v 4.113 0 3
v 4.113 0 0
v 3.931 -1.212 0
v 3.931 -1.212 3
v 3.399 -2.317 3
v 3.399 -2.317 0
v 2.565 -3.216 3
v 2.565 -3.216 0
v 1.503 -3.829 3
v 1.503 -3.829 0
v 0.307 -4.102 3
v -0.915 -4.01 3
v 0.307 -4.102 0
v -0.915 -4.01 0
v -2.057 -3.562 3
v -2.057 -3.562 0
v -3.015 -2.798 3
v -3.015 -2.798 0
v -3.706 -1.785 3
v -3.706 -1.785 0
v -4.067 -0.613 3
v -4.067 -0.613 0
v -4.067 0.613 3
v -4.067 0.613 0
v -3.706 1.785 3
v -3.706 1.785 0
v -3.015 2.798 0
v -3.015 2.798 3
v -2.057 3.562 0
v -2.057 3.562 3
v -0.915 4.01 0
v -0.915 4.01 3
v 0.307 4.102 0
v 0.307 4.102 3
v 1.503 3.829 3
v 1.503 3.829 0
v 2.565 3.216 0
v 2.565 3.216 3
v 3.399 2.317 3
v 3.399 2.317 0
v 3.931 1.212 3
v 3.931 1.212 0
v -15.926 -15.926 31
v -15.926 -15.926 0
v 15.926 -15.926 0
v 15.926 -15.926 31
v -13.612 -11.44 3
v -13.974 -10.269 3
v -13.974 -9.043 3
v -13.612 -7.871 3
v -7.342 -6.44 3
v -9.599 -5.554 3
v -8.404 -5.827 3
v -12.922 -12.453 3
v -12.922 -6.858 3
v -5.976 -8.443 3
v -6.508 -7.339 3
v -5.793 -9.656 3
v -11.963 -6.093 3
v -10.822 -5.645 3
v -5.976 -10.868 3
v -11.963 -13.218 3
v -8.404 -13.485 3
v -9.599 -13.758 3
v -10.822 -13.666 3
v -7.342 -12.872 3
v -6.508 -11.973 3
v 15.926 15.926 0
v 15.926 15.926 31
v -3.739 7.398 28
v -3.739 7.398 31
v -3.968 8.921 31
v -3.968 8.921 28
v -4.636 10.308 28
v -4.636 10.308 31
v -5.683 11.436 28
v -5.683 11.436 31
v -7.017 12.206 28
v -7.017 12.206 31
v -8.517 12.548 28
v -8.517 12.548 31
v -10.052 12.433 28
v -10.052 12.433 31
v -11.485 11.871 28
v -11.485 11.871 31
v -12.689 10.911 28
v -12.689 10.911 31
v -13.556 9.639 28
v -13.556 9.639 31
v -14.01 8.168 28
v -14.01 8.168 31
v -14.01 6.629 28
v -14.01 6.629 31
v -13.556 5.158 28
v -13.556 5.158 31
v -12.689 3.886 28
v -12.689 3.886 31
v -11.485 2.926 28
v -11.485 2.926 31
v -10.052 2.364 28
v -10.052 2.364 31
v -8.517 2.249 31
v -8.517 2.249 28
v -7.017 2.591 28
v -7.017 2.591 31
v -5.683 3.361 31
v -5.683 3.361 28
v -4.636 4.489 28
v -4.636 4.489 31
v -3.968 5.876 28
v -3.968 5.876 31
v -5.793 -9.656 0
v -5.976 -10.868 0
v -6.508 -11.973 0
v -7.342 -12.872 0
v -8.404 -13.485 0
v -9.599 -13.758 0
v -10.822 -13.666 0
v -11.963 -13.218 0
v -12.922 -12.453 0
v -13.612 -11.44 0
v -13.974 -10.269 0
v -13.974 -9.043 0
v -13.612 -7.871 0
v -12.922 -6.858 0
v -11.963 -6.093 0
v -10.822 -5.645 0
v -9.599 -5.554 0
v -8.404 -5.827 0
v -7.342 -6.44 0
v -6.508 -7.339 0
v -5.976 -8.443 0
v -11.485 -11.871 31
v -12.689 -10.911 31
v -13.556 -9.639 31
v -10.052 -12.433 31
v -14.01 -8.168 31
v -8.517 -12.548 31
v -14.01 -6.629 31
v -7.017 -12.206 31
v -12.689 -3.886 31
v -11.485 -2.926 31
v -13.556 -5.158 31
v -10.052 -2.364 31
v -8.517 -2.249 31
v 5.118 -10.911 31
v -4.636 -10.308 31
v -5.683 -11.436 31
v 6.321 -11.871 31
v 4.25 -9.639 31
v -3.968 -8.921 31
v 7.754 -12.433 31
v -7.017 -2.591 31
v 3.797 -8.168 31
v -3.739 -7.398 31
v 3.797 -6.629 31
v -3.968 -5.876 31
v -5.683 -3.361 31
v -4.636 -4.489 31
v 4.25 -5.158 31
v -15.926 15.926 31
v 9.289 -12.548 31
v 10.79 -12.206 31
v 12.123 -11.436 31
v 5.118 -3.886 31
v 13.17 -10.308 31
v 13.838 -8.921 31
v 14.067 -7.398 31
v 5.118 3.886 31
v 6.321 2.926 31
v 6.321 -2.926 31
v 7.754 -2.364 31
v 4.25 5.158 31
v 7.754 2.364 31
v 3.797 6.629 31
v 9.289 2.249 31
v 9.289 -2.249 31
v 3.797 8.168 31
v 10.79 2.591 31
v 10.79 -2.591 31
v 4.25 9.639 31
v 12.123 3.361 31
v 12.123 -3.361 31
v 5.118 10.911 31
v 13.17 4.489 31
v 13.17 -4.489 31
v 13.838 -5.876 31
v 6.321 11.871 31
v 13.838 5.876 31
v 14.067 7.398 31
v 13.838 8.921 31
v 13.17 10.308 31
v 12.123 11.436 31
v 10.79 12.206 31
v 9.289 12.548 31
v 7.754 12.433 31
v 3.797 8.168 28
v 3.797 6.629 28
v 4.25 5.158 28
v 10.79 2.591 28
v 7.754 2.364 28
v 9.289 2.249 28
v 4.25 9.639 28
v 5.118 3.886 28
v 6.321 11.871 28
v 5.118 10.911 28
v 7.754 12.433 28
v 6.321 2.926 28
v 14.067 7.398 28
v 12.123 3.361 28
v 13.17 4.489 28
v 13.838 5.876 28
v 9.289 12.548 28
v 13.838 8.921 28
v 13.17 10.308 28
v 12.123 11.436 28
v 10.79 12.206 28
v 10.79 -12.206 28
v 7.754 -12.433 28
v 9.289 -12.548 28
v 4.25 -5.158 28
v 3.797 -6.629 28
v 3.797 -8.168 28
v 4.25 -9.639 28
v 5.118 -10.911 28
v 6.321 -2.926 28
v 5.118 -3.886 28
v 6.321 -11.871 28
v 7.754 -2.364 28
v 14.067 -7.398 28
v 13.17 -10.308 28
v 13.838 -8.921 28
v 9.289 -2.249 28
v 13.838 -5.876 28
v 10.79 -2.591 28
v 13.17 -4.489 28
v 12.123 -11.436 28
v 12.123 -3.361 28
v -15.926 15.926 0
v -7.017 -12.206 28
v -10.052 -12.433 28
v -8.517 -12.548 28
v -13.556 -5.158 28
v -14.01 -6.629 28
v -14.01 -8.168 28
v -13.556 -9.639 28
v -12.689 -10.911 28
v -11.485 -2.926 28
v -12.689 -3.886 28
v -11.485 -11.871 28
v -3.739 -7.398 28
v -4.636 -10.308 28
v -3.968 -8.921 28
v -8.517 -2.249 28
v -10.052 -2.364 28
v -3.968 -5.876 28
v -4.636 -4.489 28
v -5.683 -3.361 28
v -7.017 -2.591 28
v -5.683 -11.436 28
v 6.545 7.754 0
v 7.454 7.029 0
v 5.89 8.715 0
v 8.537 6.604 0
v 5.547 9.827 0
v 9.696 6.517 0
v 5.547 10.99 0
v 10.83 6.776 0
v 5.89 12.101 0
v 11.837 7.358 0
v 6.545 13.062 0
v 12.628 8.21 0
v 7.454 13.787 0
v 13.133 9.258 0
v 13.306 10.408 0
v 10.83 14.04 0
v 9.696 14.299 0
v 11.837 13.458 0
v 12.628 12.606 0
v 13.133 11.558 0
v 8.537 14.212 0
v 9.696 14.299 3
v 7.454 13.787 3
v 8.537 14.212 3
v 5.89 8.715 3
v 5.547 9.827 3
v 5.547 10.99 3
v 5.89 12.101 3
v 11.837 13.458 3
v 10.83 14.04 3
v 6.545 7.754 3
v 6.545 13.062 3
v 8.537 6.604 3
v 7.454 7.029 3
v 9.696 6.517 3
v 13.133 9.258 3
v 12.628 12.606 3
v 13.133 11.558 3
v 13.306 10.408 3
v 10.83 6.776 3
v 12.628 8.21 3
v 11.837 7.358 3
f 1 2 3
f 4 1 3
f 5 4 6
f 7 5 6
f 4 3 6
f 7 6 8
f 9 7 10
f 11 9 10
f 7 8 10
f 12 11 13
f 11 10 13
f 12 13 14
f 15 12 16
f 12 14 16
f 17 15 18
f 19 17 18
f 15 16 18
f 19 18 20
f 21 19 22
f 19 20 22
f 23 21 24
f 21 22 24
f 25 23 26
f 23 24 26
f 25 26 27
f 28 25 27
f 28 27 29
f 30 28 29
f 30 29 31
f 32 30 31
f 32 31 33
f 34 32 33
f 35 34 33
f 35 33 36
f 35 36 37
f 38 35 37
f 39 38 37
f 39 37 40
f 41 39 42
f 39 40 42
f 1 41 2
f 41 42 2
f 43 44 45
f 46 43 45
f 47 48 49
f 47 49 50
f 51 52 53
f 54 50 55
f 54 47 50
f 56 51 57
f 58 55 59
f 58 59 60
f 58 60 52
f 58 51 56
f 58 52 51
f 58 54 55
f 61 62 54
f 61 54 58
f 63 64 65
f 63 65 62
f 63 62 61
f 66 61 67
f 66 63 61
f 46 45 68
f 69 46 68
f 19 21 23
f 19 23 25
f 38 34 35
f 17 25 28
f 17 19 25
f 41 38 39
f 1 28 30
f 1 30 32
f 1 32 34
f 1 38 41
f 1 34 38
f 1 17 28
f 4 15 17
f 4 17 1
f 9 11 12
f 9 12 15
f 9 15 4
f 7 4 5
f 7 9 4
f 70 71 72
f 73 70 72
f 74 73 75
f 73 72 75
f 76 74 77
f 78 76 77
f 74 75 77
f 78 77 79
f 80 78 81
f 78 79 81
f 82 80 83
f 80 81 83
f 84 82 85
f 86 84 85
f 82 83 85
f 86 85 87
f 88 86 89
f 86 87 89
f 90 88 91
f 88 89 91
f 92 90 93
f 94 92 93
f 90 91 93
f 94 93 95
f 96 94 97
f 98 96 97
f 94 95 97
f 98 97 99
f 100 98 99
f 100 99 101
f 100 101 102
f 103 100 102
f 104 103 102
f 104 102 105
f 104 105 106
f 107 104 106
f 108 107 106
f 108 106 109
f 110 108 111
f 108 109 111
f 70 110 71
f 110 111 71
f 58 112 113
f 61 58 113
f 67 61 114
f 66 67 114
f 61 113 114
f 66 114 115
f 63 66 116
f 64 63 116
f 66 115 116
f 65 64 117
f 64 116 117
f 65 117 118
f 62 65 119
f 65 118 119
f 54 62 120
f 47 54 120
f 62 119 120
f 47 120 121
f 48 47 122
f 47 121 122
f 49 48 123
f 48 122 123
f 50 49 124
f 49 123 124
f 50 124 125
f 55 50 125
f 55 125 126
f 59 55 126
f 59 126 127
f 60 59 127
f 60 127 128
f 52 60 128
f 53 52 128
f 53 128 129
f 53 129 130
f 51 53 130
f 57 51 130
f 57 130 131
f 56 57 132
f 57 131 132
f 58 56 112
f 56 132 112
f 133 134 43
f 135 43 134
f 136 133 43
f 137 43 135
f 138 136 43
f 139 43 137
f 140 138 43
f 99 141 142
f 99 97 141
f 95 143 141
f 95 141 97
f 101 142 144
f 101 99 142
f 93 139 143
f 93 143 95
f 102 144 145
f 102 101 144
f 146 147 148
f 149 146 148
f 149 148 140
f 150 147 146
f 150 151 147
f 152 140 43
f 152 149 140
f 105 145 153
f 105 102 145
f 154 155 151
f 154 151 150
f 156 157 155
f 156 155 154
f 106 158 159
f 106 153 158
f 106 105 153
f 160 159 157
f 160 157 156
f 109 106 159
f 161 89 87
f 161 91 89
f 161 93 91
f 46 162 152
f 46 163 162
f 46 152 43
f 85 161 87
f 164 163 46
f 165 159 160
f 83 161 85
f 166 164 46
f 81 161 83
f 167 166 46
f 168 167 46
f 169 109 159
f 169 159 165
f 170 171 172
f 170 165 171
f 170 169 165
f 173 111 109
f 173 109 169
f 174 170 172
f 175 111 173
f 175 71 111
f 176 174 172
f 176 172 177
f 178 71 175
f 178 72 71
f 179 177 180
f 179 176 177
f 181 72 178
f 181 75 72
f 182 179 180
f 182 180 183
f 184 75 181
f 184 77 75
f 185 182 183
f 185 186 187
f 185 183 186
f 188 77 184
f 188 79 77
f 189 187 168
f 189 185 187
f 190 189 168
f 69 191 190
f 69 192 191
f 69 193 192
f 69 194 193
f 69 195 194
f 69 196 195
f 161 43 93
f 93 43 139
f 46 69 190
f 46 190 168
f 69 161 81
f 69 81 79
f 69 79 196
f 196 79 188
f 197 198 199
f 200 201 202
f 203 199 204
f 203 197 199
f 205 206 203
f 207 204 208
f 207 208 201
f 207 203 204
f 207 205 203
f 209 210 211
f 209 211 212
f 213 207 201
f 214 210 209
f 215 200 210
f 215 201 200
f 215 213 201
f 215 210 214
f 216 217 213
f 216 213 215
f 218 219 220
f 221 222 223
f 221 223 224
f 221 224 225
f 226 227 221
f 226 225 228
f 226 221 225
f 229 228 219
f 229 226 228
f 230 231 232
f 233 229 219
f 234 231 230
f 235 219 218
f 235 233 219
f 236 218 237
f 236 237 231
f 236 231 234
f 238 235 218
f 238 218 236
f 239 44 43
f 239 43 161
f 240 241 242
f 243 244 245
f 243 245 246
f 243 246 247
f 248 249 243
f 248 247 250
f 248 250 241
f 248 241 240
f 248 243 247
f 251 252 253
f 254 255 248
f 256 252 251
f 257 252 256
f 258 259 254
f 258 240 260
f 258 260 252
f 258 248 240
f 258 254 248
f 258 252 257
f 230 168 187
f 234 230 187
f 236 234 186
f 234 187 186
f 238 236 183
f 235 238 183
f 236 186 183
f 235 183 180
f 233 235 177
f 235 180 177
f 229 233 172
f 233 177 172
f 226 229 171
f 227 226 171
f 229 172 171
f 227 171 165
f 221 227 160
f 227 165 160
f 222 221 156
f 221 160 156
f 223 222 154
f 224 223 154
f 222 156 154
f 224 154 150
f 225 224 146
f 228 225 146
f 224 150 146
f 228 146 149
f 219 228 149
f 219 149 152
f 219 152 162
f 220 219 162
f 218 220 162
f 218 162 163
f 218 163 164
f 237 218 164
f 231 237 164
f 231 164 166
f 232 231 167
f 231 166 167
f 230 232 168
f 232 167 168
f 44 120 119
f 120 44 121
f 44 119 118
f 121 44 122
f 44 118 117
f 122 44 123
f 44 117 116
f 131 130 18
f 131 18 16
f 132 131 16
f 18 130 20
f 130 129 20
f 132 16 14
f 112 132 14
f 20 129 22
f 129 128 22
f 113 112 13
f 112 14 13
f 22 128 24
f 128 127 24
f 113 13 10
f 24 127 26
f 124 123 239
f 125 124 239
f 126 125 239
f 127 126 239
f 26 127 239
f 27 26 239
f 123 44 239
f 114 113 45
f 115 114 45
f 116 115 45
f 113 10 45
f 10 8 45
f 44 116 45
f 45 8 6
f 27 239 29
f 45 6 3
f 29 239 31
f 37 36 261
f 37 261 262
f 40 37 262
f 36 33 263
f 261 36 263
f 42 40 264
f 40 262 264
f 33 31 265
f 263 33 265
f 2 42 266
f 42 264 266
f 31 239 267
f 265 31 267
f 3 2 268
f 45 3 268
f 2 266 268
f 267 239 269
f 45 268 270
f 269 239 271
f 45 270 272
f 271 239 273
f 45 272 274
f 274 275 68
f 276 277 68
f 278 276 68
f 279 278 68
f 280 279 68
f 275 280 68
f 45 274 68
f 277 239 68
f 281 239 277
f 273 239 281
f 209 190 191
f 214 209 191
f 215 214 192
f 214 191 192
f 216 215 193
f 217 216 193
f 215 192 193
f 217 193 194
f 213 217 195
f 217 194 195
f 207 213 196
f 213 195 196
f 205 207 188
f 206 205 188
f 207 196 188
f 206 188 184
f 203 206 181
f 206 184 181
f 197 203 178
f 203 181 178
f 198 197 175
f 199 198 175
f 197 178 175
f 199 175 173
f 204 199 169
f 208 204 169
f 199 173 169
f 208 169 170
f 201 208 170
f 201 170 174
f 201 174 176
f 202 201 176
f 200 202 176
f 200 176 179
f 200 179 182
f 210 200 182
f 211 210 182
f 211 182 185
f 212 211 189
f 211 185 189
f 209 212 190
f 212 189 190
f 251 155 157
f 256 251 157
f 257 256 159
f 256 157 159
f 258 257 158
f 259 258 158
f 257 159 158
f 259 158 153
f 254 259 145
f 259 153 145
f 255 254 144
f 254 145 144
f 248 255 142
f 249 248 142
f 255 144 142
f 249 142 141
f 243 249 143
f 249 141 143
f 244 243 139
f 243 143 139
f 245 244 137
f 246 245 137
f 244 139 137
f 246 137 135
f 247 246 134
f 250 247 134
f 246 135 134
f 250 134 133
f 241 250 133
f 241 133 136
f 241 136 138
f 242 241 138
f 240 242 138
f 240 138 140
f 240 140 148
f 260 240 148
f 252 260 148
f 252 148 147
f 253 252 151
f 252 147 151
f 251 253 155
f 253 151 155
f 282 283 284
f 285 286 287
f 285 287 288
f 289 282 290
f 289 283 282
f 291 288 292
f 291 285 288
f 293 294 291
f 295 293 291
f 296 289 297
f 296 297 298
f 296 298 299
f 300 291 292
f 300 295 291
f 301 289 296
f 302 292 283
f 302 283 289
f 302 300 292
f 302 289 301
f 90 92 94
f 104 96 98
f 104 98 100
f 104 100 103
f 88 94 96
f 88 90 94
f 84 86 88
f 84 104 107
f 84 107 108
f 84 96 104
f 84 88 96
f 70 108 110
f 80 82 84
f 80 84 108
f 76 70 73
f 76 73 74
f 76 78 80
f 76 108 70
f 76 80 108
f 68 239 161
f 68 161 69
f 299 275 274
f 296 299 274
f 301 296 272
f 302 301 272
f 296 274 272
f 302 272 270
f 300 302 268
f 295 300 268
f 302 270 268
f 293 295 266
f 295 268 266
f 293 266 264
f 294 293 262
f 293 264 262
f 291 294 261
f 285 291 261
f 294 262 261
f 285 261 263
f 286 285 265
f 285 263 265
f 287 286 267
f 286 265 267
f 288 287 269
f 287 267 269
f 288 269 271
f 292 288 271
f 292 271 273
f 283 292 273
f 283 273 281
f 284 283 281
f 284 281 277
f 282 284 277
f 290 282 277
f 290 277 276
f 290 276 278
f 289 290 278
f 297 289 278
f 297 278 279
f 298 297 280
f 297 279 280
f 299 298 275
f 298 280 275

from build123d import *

# Parameters (mm, degrees)
F0_W     = 31.851116
F0_H     = 31.851116
F1_DEPTH = 31
F2_R     = 5.164209
F3_DEPTH = 3
F4_R     = 4.113364
F4_R_2   = 3.901474
F5_DEPTH = 3


with BuildPart() as f1:
    # F0 (on Top) → F1 (new body)
    with BuildSketch(Plane.XY):
        Rectangle(F0_W, F0_H)
    extrude(amount=F1_DEPTH)

    # F2 (on face) → F3 (cut)
    with BuildSketch(Plane.XY.offset(31)):
        with Locations((-8.903265, 7.398488)):
            Circle(F2_R)
        with Locations((8.903265, 7.398488)):
            Circle(F2_R)
        with Locations((8.903265, -7.398488)):
            Circle(F2_R)
        with Locations((-8.903265, -7.398488)):
            Circle(F2_R)
    extrude(amount=-F3_DEPTH, mode=Mode.SUBTRACT)

    # F4 (on face) → F5 (cut)
    with BuildSketch(Plane(origin=(0, 0, 0), x_dir=(1, 0, 0), z_dir=(0, 0, -1))):
        with Locations((-9.906449, 9.655653)):
            Circle(F4_R)
        Circle(F4_R)
        with Locations((9.404857, -10.408042)):
            Circle(F4_R_2)
    extrude(amount=-F5_DEPTH, mode=Mode.SUBTRACT)


solid = f1.part
